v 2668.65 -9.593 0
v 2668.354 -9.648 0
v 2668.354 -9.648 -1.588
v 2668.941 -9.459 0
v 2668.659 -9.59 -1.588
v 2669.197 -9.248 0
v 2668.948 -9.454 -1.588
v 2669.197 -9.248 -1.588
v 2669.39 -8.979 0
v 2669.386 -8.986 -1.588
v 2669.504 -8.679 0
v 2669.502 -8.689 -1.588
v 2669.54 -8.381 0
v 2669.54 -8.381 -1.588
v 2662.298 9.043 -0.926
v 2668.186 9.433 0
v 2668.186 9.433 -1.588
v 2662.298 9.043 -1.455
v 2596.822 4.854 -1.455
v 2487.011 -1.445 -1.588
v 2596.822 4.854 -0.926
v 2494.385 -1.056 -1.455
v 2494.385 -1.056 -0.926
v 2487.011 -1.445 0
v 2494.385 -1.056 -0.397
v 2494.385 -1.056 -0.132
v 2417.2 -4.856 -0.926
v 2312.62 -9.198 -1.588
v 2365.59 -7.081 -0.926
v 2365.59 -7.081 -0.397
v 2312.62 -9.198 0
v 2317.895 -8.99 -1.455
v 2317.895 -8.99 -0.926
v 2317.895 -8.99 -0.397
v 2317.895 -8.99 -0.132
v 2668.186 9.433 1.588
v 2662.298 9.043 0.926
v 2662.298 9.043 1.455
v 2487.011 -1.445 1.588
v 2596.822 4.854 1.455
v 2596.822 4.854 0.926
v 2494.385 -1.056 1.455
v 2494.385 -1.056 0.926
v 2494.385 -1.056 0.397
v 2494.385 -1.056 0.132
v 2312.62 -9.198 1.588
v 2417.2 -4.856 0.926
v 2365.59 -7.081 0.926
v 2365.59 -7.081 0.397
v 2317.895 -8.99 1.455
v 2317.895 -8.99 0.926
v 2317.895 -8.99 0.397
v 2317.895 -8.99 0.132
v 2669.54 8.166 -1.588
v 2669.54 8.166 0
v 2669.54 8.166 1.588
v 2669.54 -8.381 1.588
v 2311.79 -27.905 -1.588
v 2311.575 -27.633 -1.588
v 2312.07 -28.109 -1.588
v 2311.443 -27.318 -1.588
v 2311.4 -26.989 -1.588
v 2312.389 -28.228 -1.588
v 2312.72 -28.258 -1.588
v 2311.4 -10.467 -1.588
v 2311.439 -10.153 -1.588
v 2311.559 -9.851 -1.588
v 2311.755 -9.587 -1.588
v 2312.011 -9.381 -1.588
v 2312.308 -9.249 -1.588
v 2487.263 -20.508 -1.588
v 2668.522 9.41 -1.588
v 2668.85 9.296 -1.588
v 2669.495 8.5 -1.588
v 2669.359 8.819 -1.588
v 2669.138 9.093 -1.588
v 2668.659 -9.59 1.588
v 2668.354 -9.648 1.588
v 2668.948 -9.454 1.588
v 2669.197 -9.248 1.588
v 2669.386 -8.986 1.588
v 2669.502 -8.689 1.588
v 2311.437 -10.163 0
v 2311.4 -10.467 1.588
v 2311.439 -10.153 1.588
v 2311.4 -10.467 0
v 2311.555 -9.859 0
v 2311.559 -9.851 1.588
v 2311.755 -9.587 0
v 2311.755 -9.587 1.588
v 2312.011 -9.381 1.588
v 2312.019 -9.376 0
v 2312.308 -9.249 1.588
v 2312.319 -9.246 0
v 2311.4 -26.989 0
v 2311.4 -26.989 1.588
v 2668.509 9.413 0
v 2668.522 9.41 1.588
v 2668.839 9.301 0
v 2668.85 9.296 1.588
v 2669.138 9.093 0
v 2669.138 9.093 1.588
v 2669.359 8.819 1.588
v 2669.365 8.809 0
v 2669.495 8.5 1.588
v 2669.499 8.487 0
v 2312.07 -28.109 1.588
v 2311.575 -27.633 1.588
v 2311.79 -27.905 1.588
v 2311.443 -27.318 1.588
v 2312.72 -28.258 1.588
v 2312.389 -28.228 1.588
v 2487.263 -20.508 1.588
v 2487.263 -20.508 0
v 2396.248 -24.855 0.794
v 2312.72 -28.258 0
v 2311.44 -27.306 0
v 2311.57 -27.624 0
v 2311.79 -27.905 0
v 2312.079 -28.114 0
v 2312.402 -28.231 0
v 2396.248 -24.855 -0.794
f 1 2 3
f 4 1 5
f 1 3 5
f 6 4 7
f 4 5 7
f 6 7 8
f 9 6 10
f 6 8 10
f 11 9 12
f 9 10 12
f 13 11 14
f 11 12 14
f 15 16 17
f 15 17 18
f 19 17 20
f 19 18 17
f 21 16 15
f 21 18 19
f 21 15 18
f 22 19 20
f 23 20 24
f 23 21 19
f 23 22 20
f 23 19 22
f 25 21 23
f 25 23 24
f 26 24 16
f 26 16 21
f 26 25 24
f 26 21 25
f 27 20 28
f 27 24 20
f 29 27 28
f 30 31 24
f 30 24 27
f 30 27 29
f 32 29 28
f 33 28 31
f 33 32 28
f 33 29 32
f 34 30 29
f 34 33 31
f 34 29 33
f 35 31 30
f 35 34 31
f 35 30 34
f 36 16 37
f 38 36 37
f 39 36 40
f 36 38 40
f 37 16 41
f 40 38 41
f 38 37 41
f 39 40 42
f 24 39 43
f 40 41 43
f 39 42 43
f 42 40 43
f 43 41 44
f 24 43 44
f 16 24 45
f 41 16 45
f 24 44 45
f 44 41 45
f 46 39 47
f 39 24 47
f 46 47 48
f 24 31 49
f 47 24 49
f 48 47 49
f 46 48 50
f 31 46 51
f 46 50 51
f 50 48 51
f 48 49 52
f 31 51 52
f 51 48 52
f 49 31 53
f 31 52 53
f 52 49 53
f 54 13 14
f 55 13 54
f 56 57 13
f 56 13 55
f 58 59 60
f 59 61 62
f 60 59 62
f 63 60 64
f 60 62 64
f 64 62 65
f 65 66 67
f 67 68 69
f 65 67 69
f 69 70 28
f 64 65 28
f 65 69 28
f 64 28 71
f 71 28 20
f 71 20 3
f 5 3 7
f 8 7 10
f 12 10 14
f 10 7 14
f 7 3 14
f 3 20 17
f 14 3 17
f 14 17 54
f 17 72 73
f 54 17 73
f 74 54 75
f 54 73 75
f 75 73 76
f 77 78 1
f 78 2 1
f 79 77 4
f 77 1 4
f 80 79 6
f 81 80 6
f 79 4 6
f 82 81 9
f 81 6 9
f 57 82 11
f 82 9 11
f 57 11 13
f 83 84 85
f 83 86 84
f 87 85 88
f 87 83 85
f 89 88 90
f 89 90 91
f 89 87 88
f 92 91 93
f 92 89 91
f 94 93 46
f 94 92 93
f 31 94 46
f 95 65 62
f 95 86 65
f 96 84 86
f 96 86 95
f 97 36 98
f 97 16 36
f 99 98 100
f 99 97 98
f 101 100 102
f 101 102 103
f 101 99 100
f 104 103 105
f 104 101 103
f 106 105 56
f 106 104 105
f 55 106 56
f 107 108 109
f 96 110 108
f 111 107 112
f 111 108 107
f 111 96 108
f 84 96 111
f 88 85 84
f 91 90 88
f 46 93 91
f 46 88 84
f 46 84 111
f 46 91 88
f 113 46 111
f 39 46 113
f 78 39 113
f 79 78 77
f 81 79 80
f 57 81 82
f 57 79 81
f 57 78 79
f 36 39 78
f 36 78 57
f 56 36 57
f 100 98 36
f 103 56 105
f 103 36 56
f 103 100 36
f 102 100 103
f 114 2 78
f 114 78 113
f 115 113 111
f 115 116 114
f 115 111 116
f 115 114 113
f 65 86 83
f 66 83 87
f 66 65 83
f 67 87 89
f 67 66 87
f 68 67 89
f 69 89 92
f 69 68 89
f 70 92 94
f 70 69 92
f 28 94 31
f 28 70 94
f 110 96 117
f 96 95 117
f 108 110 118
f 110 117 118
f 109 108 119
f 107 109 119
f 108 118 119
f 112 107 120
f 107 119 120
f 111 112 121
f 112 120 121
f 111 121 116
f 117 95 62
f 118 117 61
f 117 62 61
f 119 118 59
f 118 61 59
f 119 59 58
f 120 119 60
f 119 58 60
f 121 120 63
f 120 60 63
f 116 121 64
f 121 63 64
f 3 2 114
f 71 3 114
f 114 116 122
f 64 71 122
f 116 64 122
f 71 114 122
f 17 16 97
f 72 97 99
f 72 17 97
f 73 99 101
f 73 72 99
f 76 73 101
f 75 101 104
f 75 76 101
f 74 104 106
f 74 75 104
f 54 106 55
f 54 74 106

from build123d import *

# Parameters (mm, degrees)
BOSS_EXTRUDE1_DEPTH = 1.5875
FILLET1_R           = 1.27


with BuildPart() as part:
    # Sketch1 → Boss-Extrude1 (new body, symmetric)
    with BuildSketch(Plane.XY):
        with BuildLine():
            Line((2311.4, -9.245652974), (2311.4, -28.310356345))
            add(Edge.make_bspline(
                [(2669.54, -9.569049356), (2615.393603553, -13.17073937), (2561.080658619, -16.536108081), (2506.205230446, -19.758621957), (2434.382223772, -23.29947809), (2362.559217098, -26.286274493), (2345.393069943, -26.972929947), (2328.342945407, -27.644579597), (2311.4, -28.310356345)],
                knots=[103.698913506, 103.698913506, 103.698913506, 103.698913506, 103.698913506, 103.698913506, 130.927896619, 130.927896619, 130.927896619, 139.270260279, 139.270260279, 139.270260279, 139.270260279, 139.270260279, 139.270260279], degree=5))
            Line((2669.54, -9.569049356), (2669.54, 9.5231025))
            add(Edge.make_bspline(
                [(2669.54, 9.5231025), (2667.126494524, 9.36235515), (2659.861586685, 8.880281494), (2635.666282302, 7.292469146), (2596.857665529, 4.826056853), (2545.729743039, 1.758344093), (2494.405305707, -1.098555235), (2451.533022267, -3.266573297), (2417.198316756, -4.86708361), (2391.457076919, -6.003589235), (2365.634736307, -7.086854581), (2341.015642019, -8.078542398), (2322.924133841, -8.79260451), (2313.562932275, -9.160652062), (2311.4, -9.245652974)],
                knots=[103.571582669, 103.571582669, 103.571582669, 103.571582669, 104.300777207, 105.766098403, 110.877392287, 115.98868617, 121.099980054, 126.211273938, 128.76692088, 131.322567822, 133.878214764, 136.433861706, 138.557690156, 139.196601892, 139.196601892, 139.196601892, 139.196601892], degree=3))
        make_face()
    extrude(amount=BOSS_EXTRUDE1_DEPTH, both=True)

    # Fillet1
    fillet1_edges = [part.edges().sort_by_distance(p)[0] for p in [
        (2669.54, 9.5231025, -0.79375),
        (2669.54, -9.569049356, -0.79375),
        (2311.4, -9.245652974, -0.79375),
        (2311.4, -28.310356345, -0.79375),
    ]]
    fillet(fillet1_edges, radius=FILLET1_R)


solid = part.part
